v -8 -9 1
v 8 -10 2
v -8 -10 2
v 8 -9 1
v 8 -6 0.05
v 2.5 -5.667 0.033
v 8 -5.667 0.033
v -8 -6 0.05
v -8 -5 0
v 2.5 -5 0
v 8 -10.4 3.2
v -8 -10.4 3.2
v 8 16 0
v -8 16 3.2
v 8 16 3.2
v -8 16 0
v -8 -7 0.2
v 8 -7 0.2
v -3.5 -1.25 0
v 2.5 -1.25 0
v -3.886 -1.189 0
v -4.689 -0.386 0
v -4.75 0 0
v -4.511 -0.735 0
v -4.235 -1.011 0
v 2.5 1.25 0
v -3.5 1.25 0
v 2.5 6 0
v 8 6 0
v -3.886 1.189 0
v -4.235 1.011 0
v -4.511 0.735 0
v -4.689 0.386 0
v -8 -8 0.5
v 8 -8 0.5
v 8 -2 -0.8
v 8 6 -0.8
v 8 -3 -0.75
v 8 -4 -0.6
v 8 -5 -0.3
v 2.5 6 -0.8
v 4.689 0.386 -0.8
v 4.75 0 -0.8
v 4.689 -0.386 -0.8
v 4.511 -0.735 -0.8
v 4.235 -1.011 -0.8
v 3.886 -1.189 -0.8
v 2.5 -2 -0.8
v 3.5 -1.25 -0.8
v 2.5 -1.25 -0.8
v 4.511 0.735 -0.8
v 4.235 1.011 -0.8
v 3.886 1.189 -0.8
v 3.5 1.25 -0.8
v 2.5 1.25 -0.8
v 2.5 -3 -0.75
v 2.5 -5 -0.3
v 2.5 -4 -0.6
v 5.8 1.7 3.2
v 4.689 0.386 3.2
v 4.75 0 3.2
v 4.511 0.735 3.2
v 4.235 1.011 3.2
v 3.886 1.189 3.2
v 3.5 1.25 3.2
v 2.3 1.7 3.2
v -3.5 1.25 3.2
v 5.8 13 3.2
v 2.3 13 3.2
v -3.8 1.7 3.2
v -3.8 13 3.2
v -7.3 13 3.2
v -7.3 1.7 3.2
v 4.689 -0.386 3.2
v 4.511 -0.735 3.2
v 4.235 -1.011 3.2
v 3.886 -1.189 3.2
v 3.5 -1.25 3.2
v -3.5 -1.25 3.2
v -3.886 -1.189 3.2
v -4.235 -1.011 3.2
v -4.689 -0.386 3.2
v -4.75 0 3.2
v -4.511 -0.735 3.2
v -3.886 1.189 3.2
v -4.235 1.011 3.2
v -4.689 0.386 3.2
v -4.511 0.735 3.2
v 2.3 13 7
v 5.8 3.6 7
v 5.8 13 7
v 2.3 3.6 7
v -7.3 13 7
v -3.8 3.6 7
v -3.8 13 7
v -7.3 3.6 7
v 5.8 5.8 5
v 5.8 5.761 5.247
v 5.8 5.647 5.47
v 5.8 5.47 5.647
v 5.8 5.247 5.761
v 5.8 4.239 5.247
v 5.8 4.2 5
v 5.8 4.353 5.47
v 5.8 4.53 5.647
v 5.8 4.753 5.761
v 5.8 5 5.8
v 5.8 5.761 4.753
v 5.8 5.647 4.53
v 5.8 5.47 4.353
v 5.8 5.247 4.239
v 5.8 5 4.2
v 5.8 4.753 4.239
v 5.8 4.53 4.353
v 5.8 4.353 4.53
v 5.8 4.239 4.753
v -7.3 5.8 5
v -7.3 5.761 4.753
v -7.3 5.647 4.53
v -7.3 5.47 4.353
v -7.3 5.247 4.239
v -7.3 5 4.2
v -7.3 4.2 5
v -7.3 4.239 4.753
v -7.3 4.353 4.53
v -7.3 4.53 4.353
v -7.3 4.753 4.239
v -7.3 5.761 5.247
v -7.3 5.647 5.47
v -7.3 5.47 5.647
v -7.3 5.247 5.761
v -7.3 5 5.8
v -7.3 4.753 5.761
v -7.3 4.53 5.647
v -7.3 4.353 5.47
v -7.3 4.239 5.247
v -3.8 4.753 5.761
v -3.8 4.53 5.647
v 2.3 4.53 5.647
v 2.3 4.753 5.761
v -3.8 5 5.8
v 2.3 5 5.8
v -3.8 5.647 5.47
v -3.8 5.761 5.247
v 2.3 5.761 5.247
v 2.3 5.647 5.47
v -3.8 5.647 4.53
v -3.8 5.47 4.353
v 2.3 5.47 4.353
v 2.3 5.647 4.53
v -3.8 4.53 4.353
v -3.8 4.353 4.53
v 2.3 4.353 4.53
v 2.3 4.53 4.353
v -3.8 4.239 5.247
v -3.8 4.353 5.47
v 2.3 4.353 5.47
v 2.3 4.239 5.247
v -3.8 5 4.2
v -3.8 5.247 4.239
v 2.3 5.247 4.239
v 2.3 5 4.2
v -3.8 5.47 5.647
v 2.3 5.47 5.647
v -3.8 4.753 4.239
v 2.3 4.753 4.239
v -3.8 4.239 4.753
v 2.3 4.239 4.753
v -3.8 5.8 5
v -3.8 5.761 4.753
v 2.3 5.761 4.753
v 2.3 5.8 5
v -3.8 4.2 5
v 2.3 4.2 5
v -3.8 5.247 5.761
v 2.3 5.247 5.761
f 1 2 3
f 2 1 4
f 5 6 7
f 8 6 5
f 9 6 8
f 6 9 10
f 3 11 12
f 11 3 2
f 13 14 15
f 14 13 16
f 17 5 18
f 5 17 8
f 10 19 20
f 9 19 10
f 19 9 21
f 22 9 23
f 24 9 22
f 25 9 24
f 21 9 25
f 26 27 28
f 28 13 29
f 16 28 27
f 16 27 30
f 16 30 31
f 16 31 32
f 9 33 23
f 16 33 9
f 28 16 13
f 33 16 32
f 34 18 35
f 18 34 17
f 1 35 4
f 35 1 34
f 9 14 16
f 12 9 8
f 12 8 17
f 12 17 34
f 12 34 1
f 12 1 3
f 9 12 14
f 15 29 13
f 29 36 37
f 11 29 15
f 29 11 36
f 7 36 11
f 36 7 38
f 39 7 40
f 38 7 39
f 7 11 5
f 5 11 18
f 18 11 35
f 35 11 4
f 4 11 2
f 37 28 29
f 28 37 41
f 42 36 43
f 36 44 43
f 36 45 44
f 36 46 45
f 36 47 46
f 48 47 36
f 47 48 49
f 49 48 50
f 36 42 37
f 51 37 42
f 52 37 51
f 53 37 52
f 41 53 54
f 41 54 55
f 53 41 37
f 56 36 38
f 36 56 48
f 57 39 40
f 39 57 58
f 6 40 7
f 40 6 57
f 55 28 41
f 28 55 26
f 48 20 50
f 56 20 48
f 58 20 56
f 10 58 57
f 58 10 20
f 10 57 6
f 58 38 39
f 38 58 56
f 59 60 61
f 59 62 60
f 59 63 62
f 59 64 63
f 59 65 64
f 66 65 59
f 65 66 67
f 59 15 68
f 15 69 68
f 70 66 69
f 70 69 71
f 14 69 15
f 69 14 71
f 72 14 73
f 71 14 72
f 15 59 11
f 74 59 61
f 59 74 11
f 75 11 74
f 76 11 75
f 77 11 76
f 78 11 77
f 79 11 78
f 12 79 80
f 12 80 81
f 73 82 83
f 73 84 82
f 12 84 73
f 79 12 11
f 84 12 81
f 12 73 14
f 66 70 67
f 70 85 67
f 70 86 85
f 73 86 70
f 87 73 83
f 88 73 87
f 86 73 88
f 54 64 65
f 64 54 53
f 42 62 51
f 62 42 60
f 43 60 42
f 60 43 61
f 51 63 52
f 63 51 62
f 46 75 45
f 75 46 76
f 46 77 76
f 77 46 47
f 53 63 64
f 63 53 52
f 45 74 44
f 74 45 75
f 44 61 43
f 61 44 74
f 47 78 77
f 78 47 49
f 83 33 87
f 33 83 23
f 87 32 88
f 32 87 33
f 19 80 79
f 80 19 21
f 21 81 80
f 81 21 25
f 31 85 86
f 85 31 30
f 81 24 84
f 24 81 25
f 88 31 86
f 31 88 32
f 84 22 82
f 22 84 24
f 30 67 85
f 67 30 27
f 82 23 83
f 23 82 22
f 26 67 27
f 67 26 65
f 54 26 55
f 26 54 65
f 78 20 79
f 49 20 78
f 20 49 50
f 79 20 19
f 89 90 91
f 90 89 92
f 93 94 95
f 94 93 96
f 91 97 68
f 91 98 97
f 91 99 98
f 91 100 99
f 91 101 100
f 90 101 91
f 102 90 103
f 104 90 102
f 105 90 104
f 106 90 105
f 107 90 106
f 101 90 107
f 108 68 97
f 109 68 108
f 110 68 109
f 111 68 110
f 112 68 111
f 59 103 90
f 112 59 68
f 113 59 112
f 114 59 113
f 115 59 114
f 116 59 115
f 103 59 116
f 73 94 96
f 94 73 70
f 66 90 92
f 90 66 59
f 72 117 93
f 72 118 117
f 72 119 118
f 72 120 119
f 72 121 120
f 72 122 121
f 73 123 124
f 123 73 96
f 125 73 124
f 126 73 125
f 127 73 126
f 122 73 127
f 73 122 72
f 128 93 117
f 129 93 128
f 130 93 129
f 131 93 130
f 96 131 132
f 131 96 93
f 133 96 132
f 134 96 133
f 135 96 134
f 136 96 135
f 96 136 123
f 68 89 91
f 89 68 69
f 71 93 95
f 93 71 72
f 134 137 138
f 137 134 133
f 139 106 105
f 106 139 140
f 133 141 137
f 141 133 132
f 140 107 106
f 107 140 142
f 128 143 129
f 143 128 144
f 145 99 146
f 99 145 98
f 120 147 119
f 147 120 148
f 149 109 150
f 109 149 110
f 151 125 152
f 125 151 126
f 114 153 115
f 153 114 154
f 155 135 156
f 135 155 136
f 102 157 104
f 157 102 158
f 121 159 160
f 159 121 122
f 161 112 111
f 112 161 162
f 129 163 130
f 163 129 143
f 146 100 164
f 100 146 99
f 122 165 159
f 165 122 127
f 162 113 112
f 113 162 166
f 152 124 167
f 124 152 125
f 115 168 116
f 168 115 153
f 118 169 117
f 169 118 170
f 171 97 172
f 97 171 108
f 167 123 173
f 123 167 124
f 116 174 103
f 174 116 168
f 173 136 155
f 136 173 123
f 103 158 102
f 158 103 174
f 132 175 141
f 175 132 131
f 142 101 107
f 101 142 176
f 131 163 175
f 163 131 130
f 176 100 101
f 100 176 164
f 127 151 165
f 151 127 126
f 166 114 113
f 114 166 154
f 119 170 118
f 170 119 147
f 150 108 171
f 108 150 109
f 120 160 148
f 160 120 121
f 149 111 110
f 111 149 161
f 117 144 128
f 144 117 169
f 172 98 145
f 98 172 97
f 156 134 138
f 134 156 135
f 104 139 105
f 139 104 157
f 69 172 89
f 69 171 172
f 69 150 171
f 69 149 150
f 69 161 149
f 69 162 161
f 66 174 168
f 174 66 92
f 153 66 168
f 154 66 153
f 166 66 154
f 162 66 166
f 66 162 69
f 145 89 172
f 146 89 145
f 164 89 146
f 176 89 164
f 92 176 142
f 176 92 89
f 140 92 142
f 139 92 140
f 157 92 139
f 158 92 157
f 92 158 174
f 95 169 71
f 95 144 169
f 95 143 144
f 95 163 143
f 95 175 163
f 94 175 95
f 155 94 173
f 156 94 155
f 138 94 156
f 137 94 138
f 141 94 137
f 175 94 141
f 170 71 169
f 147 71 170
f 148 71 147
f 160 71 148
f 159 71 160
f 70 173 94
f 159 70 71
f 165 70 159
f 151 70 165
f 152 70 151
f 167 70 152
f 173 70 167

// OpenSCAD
// file: guided_sewing_foot_template.scad
// The diameter of the MATIC rod
matic_rod_diameter = 1.6;

// The height at which the MATIC rod is placed over the plate (the least strict parameter, as the foot is amortized)
matic_rod_dz = 5.0; 

// The Y offset between the MATIC rod and the needle
matic_offset_dy = 5.0;

// The total width of the MATIC handle (including allowance)
matic_handle_width = 6.1; 

// The X offset between the needle and the center of the MATIC handle on Janome machines with a maximum stitch width of 7 mm 
janome_matic_offset_dx = -0.75;

// The width of the transport mechanism in the Janome machines
janome_transport_width = 16.0;

needle_tunnel_length_max = 7.0;
needle_tunnel_margin = 4.0;

foot_base_leftside_width = janome_transport_width / 2;
foot_base_rightside_width_full = janome_transport_width / 2;

guide_min_width = 1.6;
ear_width = 3.5;

foot_base_height = 3.2;

primary_front_length = 5.0;
primary_back_length = 16.0;

short_guide_front_length = 2.0;
short_guide_back_length = 6.0;

ears_piece_width = matic_handle_width + ear_width * 2;
right_ear_edge_x = janome_matic_offset_dx + matic_handle_width / 2 + ear_width;

module reflection(
    mirror_vector = [1, 0, 0]
) {
    union() {
        children();
        mirror(mirror_vector) {
            children();
        }
    }
}

module make_wing(
    width,
    front_length,
    back_length,
) {
    h_max = 5.0;
    dx = 1;
    
    rotate([180, -90, 0])
    linear_extrude(height=width)
    polygon(
        points=[
            [h_max, -back_length],
            [0, -back_length],
            [0.00, front_length + dx * 0],
            [0.05, front_length + dx * 1],
            [0.20, front_length + dx * 2],
            [0.50, front_length + dx * 3],
            [1.00, front_length + dx * 4],
            [2.00, front_length + dx * 5],
            [h_max, front_length + dx * 6]
        ],
        paths=[
            [0, 1, 2, 3, 4, 5, 6, 7, 8],
        ]
    );
}

module top_cutter_global() {
    a = 40;
    h = 20;
    
    translate([-a / 2, -a / 2, foot_base_height])
    cube([a, a, h]);
}

module ears_piece_base_local() {
    back_length = 8.0;
    height = 4.0;
    
    translate([-ears_piece_width/2, 0, 0])
    rotate([180, -90, 0])
    linear_extrude(height=ears_piece_width)
    polygon(
        points=[
            [height / 2, -back_length],
            [-height / 2, -back_length],
            [-height / 2, 3.4],
            [height / 2, 1.4],
        ],
        paths=[
            [0, 1, 2, 3],
        ]
    );
}

module matic_rod_cutter_local() {
    length = 40;
    
    translate([-length / 2, 0, 0])
    rotate([180, -90, 0])
    cylinder(h = length, r = matic_rod_diameter / 2, $fn = 20);
}

module matic_handle_cutter_local() {
    a = matic_handle_width;
    h = 30;
    
    translate([-a / 2, -h / 2, -h / 2])
    cube([a, h, h]);
}

module ears_piece_local() {
    difference() {
        difference() {
            ears_piece_base_local();
            matic_rod_cutter_local();
        }
        matic_handle_cutter_local();
    }
}

module ears_piece_global() {
    translate([
        janome_matic_offset_dx,
        matic_offset_dy,
        matic_rod_dz,
    ])
    ears_piece_local();
}

module make_needle_tunnel_cutter(
    length,
    width,
) {
    height = 10;

    translate([0, 0, -height / 2]) {
        translate([-length / 2, -width / 2, 0])
        cube([length, width, height]);

        reflection([1, 0, 0]) {
            translate([length / 2, 0, 0])
            cylinder(h = height, r = width / 2, $fn = 20);
        }
    }
}

module make_guided_foot(
    // The distance between the needle and the guide
    guide_offset,
    secondary_guide_offset = undef,
    guide_depth = 0.8,
    needle_tunnel_length_limit = needle_tunnel_length_max,
    use_full_width = true,
    use_full_length = false,
) {
    guide_front_length = use_full_length ? primary_front_length : short_guide_front_length;
    guide_back_length = use_full_length ? primary_back_length : short_guide_back_length;

    foot_base_rightside_width_free = use_full_width ? foot_base_rightside_width_full : right_ear_edge_x;
    foot_base_rightside_width = max(guide_offset, foot_base_rightside_width_free);

    // The nominal lenth of the needle tunnel (the maximal usable stich width)
    needle_tunnel_length_safe = (foot_base_rightside_width - needle_tunnel_margin) * 2;
    needle_tunnel_length_effective_max = min(needle_tunnel_length_limit, needle_tunnel_length_max);
    needle_tunnel_length = min(needle_tunnel_length_safe, needle_tunnel_length_effective_max);

    module make_guide(
        offset,
        base_side_width,
    ) {
        width = max(foot_base_rightside_width - offset, guide_min_width);

        translate([offset, 0, -guide_depth])
        make_wing(
            width = width,
            front_length = guide_front_length,
            back_length = guide_back_length
        );
    }

    module foot_base_global() {
        translate([-foot_base_leftside_width, 0, 0])
        make_wing(
            width = foot_base_leftside_width + foot_base_rightside_width,
            front_length = primary_front_length,
            back_length = primary_back_length
        );
    }

    module guide_global() {
        make_guide(
            offset = guide_offset,
            base_side_width = foot_base_rightside_width
        );
    }

    module secondary_guide_global() {
        if (!is_undef(secondary_guide_offset)) {
            scale([-1, 1, 1])
            make_guide(
                offset = secondary_guide_offset,
                base_side_width = foot_base_leftside_width
            );
        }
    }

    module guided_foot_global() {
        difference() {
            difference() {
                union() {
                    foot_base_global();
                    guide_global();
                    secondary_guide_global();
                }

                top_cutter_global();
            };

            needle_tunnel_cutter_global();
        }

        ears_piece_global();
    }

    module needle_tunnel_cutter_global() {
        make_needle_tunnel_cutter(
            length = needle_tunnel_length,
            width = 2.5
        );
    }

    guided_foot_global();
}
// main file
include <guided_sewing_foot_template.scad>;

make_guided_foot(
    guide_offset = 2.5
);
